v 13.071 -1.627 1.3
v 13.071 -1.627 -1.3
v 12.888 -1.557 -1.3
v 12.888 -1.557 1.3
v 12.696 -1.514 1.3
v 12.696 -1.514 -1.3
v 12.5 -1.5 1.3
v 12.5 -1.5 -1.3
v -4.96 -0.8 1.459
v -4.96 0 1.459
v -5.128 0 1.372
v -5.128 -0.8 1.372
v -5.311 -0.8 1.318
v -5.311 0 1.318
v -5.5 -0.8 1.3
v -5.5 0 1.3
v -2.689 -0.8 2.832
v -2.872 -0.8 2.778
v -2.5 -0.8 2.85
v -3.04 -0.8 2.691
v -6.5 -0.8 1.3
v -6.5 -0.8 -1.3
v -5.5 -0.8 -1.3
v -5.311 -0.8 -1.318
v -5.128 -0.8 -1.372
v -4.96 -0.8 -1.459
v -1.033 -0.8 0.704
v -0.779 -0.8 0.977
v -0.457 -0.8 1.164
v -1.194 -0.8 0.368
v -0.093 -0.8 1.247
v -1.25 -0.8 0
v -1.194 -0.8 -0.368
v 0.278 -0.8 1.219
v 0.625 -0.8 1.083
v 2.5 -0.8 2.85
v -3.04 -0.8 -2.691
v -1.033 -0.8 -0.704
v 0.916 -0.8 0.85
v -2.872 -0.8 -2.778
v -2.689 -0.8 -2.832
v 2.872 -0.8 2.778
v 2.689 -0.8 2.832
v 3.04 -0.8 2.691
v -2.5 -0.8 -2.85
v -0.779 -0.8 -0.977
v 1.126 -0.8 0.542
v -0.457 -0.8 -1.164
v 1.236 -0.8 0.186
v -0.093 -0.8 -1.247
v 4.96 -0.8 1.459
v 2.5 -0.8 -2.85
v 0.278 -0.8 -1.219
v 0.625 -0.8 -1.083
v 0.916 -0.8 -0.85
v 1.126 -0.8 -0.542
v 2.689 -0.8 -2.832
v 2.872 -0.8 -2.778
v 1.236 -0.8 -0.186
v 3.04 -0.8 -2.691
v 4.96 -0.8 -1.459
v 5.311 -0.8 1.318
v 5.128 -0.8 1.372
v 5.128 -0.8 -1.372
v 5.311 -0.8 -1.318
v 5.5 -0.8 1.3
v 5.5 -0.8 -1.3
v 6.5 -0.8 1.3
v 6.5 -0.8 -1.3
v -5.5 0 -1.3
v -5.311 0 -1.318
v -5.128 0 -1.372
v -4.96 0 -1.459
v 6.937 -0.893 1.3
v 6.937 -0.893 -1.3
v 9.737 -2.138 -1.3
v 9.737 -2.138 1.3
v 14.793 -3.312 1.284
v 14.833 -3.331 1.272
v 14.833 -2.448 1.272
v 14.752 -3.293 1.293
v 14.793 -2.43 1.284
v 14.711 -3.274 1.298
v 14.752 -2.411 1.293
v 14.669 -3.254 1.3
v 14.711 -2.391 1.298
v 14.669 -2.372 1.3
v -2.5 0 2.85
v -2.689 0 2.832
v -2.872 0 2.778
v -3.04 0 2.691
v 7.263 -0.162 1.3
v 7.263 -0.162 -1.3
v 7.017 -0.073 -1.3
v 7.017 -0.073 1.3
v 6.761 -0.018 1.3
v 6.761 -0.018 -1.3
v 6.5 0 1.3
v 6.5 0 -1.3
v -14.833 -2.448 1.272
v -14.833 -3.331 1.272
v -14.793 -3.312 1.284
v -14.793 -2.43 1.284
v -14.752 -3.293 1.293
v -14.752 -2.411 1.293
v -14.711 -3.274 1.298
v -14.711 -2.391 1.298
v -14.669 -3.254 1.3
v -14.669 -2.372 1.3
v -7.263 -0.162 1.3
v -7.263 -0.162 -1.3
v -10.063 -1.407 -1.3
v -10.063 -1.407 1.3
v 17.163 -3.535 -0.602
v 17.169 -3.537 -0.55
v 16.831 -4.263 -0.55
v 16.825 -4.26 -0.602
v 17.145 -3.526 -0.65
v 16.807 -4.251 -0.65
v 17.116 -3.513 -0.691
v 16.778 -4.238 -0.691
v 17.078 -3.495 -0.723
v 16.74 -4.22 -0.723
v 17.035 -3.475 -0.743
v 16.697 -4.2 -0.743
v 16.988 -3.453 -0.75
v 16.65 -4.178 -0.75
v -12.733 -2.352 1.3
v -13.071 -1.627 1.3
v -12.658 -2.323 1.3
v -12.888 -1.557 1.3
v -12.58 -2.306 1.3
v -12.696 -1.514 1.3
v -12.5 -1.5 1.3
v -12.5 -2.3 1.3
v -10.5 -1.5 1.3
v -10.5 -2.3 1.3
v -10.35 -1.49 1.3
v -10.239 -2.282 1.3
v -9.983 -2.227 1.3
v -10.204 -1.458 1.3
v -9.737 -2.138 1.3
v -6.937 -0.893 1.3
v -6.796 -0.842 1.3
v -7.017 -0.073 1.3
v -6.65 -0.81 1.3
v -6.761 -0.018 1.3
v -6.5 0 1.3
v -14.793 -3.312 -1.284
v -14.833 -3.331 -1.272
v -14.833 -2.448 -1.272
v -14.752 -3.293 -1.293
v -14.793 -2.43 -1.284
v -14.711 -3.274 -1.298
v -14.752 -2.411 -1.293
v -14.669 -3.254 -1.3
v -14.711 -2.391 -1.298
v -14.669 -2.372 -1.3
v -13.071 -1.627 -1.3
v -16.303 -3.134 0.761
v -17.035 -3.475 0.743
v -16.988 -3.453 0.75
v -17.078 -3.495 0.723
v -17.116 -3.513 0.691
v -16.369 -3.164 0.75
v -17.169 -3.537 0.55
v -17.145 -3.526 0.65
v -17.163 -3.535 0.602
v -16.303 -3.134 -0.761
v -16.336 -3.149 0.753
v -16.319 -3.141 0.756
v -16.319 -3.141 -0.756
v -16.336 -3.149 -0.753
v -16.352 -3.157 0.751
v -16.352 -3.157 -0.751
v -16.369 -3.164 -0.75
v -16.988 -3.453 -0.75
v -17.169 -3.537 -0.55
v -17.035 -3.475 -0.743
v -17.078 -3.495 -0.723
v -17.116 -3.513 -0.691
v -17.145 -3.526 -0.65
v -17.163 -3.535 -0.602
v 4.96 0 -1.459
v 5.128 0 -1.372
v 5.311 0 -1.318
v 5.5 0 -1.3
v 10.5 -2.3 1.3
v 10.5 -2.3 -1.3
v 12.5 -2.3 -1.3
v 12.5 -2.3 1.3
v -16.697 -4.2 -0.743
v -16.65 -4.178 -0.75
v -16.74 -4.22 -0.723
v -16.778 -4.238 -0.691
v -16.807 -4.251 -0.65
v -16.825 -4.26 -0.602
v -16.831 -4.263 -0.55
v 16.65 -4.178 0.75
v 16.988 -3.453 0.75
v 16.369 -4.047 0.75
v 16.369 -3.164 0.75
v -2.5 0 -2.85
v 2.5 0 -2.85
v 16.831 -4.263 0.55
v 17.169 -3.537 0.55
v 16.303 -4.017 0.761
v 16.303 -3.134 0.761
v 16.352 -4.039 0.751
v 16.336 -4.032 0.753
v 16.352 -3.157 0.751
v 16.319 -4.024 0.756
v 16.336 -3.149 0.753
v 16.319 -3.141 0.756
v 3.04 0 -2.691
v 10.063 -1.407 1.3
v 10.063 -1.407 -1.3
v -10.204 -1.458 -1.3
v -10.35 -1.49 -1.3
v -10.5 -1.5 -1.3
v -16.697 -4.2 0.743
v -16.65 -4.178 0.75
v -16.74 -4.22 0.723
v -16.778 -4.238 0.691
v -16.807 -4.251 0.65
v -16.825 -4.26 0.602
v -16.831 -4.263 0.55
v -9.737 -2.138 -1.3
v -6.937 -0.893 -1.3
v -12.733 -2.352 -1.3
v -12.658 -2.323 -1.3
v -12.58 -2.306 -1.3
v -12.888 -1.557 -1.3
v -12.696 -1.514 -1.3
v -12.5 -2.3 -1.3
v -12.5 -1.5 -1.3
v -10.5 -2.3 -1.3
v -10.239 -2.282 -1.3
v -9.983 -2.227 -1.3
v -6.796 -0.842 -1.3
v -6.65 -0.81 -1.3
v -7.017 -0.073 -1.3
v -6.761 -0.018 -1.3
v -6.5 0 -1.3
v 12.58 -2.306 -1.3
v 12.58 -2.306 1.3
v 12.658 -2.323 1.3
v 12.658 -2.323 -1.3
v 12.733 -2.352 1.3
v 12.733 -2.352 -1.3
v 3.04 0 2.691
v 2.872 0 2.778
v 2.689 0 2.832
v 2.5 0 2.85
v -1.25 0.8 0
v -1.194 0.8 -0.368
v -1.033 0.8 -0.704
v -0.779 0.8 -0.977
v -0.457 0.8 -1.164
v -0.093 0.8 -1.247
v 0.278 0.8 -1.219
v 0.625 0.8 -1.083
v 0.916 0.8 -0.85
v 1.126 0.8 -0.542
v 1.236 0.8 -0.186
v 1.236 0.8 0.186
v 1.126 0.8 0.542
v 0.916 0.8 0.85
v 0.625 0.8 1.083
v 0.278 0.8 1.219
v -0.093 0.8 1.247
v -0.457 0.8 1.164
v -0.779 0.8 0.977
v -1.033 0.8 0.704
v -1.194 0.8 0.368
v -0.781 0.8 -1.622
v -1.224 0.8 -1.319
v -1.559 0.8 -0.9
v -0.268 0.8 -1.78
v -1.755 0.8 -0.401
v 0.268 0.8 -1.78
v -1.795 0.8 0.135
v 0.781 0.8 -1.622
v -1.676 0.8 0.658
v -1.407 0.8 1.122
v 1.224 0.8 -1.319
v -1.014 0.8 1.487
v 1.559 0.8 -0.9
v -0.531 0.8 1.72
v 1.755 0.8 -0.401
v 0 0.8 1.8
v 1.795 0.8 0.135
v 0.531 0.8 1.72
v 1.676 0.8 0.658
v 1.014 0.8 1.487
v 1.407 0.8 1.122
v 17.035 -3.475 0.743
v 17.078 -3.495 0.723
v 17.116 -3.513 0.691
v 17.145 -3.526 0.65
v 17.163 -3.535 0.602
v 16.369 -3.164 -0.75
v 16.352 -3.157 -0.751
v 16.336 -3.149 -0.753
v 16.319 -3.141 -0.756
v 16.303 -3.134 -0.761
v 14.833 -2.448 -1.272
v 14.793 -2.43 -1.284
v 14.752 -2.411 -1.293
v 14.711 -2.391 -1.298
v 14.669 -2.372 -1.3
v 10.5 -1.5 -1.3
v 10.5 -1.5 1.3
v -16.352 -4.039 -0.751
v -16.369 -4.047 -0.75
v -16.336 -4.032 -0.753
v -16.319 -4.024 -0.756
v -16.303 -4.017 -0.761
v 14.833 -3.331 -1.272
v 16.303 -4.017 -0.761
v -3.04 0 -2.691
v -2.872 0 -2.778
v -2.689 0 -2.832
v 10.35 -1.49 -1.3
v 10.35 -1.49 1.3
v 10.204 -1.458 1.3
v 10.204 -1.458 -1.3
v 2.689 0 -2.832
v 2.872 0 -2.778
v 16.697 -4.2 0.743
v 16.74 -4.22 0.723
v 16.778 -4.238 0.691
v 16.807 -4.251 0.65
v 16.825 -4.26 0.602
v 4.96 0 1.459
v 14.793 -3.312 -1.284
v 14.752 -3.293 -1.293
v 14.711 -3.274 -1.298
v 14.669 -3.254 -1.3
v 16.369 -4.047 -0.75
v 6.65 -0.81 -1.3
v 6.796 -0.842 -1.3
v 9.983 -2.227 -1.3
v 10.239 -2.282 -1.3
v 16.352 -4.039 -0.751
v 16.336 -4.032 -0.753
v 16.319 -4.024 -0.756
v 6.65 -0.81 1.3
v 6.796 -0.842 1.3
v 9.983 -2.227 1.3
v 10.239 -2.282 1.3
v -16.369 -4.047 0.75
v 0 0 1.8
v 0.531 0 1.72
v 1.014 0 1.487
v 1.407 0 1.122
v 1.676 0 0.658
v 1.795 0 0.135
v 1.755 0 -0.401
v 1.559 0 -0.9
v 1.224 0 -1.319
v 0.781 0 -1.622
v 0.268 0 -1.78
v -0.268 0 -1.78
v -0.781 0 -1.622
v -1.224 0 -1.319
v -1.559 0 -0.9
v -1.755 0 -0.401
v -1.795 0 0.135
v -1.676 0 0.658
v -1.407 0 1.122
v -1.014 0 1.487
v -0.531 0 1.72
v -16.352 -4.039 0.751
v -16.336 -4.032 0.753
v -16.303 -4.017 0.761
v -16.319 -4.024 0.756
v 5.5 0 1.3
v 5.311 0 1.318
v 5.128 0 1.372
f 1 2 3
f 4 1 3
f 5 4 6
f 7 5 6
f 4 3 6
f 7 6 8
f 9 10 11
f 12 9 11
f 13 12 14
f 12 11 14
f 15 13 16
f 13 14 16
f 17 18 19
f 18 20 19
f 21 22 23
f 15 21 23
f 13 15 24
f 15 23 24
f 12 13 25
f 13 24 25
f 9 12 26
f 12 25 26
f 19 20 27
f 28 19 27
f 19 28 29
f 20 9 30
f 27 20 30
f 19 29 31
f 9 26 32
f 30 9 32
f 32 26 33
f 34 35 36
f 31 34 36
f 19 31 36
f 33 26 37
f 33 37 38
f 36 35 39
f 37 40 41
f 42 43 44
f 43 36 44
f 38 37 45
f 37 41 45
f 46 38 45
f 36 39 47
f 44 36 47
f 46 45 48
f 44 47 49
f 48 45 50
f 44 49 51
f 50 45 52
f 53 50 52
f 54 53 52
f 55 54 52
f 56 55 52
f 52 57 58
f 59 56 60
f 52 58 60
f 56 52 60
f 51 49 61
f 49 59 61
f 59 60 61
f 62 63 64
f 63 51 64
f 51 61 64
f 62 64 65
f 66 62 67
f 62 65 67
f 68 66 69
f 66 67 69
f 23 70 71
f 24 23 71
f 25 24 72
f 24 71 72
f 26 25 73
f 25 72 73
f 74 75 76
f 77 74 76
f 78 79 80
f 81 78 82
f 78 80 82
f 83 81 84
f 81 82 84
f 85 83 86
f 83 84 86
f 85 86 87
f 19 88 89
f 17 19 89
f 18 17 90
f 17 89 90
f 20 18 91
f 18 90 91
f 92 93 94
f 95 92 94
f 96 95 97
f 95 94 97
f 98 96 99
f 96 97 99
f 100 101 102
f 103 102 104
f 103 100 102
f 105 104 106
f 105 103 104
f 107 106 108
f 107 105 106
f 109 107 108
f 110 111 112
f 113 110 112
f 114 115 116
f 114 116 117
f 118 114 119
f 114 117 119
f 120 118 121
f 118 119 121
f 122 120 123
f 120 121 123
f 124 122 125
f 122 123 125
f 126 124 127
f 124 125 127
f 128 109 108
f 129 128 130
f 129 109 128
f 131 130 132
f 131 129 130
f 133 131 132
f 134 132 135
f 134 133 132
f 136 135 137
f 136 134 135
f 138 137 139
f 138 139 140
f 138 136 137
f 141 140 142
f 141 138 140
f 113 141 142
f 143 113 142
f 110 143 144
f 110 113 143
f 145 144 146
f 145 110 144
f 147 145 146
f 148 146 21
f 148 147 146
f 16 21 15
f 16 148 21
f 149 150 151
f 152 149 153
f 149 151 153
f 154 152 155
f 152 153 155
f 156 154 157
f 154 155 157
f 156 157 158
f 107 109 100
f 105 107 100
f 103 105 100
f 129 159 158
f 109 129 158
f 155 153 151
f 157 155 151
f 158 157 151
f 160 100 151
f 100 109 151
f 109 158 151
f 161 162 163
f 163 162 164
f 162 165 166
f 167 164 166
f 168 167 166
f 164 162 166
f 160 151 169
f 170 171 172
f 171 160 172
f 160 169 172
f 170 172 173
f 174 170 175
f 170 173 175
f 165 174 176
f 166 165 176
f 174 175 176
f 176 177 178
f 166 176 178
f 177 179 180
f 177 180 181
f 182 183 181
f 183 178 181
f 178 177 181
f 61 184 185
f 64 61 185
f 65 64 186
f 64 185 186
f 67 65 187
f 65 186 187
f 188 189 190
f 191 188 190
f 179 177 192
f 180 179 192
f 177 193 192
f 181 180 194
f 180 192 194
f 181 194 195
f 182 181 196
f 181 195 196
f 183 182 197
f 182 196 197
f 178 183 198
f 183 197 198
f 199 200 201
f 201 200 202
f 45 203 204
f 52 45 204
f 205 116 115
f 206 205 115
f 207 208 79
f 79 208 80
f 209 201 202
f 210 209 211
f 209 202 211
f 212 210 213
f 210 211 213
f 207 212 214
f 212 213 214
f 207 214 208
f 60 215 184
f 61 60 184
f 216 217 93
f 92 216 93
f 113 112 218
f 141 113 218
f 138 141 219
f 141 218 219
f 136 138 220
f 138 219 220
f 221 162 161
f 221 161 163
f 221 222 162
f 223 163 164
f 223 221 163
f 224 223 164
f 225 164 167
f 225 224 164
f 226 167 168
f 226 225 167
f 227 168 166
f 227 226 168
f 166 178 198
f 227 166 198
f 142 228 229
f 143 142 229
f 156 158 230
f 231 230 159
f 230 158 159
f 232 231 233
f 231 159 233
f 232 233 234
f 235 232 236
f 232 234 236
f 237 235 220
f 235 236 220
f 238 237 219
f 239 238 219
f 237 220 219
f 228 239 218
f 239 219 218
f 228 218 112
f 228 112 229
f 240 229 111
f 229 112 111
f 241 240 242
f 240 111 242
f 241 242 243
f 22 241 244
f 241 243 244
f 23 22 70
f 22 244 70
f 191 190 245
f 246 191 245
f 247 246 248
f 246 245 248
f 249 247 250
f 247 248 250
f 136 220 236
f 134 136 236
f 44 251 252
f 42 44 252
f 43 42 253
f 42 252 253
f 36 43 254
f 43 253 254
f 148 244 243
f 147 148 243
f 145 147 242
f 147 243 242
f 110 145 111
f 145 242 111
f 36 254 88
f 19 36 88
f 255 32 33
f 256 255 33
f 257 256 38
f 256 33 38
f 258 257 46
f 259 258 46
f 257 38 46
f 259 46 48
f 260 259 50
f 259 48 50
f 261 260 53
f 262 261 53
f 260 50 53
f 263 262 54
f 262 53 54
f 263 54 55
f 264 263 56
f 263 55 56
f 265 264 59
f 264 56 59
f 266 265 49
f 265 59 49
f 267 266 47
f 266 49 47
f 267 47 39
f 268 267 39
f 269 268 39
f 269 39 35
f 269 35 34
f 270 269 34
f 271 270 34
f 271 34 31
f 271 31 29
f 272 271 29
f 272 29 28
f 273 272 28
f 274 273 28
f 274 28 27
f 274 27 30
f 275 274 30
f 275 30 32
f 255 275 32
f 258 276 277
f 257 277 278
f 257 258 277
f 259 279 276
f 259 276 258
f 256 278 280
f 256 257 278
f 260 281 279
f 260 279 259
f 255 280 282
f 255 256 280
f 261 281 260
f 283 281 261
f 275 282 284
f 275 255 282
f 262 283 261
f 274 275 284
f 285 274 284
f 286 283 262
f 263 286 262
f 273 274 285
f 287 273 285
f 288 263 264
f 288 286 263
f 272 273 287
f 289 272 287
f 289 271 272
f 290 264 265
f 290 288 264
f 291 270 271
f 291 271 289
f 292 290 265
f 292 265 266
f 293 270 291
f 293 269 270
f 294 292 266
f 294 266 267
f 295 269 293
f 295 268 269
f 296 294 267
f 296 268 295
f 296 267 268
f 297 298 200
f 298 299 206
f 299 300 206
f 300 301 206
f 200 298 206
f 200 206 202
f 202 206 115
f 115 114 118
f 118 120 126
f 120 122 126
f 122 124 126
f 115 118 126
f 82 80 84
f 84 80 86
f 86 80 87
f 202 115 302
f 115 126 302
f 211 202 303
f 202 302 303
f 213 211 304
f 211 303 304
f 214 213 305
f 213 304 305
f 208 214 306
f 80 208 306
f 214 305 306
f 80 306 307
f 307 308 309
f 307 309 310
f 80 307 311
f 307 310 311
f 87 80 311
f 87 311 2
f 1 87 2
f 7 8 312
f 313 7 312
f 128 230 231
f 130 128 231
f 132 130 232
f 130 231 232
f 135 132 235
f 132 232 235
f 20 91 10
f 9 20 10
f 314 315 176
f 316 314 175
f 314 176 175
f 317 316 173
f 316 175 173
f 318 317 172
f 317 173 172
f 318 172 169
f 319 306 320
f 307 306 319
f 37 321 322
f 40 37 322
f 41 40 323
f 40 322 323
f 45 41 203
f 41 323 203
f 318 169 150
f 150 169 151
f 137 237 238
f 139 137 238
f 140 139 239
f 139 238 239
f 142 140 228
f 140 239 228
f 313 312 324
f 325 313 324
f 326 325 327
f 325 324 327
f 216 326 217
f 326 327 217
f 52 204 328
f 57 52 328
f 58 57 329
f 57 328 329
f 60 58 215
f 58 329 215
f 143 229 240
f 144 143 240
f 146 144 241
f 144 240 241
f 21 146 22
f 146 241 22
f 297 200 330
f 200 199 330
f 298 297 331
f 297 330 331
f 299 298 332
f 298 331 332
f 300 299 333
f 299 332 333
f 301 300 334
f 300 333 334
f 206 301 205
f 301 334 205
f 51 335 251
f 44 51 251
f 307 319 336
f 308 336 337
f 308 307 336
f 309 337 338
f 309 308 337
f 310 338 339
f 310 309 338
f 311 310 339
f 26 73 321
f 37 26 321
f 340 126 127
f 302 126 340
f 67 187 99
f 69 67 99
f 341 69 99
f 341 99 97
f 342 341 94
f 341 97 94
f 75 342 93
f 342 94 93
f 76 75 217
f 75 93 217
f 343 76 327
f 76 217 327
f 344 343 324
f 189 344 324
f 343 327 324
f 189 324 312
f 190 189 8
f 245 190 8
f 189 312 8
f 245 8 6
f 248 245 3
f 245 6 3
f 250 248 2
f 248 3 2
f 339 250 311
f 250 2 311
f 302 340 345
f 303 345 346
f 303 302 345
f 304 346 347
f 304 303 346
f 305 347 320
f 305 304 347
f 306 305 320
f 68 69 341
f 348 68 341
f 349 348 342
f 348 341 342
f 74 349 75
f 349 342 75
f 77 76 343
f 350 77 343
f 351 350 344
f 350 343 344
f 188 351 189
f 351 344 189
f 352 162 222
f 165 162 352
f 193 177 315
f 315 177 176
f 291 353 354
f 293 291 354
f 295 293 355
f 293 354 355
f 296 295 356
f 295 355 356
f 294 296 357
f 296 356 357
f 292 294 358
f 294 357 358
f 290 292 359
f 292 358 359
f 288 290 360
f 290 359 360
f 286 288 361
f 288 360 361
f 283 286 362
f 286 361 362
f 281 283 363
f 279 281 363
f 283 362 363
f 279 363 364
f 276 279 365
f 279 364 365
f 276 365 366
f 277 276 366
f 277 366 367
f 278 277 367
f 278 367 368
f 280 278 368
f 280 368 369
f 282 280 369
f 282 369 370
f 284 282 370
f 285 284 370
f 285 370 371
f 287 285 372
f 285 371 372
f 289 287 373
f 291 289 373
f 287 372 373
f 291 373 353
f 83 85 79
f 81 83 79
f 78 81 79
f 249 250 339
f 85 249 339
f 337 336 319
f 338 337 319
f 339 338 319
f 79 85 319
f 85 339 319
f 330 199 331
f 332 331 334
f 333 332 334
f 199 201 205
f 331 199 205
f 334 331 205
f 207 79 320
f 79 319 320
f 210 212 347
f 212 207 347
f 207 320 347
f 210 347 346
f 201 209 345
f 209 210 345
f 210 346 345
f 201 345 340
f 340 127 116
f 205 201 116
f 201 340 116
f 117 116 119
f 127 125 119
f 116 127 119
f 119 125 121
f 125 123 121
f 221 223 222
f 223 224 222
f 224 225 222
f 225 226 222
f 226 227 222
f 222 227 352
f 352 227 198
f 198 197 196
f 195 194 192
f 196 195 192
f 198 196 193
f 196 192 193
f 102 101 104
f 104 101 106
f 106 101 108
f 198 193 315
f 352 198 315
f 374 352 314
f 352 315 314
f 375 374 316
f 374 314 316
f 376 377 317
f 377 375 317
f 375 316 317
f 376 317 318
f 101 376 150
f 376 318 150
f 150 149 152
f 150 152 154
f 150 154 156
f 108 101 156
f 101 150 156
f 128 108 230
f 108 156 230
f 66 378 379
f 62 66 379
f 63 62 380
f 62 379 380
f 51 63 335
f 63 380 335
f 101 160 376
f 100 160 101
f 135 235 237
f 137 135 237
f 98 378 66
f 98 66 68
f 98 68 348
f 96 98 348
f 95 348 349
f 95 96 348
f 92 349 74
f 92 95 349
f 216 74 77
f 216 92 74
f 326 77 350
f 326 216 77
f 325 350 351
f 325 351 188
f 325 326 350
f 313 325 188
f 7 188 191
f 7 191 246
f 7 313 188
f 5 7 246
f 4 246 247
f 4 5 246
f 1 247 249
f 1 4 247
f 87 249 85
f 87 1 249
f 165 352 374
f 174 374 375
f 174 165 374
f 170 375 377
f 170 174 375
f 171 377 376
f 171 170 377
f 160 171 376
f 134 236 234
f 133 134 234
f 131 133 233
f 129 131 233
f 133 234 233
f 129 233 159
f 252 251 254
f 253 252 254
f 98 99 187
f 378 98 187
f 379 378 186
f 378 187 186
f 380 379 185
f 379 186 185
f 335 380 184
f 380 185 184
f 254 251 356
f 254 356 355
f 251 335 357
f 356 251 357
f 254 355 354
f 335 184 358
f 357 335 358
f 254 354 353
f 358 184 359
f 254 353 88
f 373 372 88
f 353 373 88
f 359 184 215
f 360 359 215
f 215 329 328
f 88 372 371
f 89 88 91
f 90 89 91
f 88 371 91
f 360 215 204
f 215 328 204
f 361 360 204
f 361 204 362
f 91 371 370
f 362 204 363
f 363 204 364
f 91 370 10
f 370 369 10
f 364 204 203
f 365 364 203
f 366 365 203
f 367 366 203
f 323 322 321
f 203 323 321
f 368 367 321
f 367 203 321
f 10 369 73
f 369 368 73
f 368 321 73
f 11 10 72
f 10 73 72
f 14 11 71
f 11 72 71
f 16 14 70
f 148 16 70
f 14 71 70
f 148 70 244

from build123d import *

# Parameters (mm, degrees)
BOSS_EXTRUDE1_DEPTH   = 0.8
SWEEP1_START          = -1.3
SWEEP1_DEPTH          = 2.6
SWEEP2_START          = -1.3
SWEEP2_DEPTH          = 2.6
CUT_EXTRUDE1_DEPTH    = 18.918364565
MIRROR3_COPY_1_DEPTH  = 18.918364565
SKETCH5_R             = 1.8
SKETCH5_R_2           = 1.2
BOSS_EXTRUDE2_DEPTH   = 0.8
M3X0_5_TAPPED_HOLE1_D = 2.5
FILLET1_R             = 0.2


# Read off the part's stored shape, not the designer's step: Sweep1, Sweep2
with BuildPart() as part:
    # Sketch1 → Boss-Extrude1 (new body)
    with BuildSketch(Plane(origin=(0, 0, 0), x_dir=(1, 0, 0), z_dir=(0, 1, 0))):
        with BuildLine():
            Line((-2.5, 2.85), (2.5, 2.85))
            ThreePointArc((2.5, 2.85), (2.78163021, 2.809523019), (3.040461339, 2.691368849))
            Line((3.040461339, 2.691368849), (4.959538661, 1.458631151))
            ThreePointArc((4.959538661, 1.458631151), (5.21836979, 1.340476981), (5.5, 1.3))
            Line((5.5, 1.3), (5.5, -1.3))
            ThreePointArc((5.5, -1.3), (5.21836979, -1.340476981), (4.959538661, -1.458631151))
            Line((4.959538661, -1.458631151), (3.040461339, -2.691368849))
            ThreePointArc((3.040461339, -2.691368849), (2.78163021, -2.809523019), (2.5, -2.85))
            Line((2.5, -2.85), (-2.5, -2.85))
            ThreePointArc((-2.5, -2.85), (-2.78163021, -2.809523019), (-3.040461339, -2.691368849))
            Line((-3.040461339, -2.691368849), (-4.959538661, -1.458631151))
            ThreePointArc((-4.959538661, -1.458631151), (-5.21836979, -1.340476981), (-5.5, -1.3))
            Line((-5.5, -1.3), (-5.5, 1.3))
            ThreePointArc((-5.5, 1.3), (-5.21836979, 1.340476981), (-4.959538661, 1.458631151))
            Line((-4.959538661, 1.458631151), (-3.040461339, 2.691368849))
            ThreePointArc((-3.040461339, 2.691368849), (-2.78163021, 2.809523019), (-2.5, 2.85))
        make_face()
    extrude(amount=-BOSS_EXTRUDE1_DEPTH)

    # Sweep1 outline → Sweep1 (add)
    with BuildSketch(Plane.XY.offset(SWEEP1_START)):
        with BuildLine():
            Line((-13.071251863, -1.626643489), (-17.169047305, -3.537476885))
            Line((-17.169047305, -3.537476885), (-16.830952695, -4.262523115))
            Line((-16.830952695, -4.262523115), (-12.733157253, -2.351689719))
            ThreePointArc((-12.733157253, -2.351689719), (-12.619409099, -2.313077423), (-12.5, -2.3))
            Line((-12.5, -2.3), (-10.5, -2.3))
            ThreePointArc((-10.5, -2.3), (-10.110231056, -2.259075901), (-9.737462135, -2.138088534))
            Line((-9.737462135, -2.138088534), (-6.937462135, -0.892887369))
            ThreePointArc((-6.937462135, -0.892887369), (-6.723607459, -0.823477842), (-6.5, -0.8))
            Line((-6.5, -0.8), (-5.5, -0.8))
            Line((-5.5, -0.8), (-5.5, 0))
            Line((-5.5, 0), (-6.5, 0))
            ThreePointArc((-6.5, 0), (-6.889768944, -0.040924099), (-7.262537865, -0.161911466))
            Line((-7.262537865, -0.161911466), (-10.062537865, -1.407112631))
            ThreePointArc((-10.062537865, -1.407112631), (-10.276392541, -1.476522158), (-10.5, -1.5))
            Line((-10.5, -1.5), (-12.5, -1.5))
            ThreePointArc((-12.5, -1.5), (-12.79256079, -1.532040618), (-13.071251863, -1.626643489))
        make_face()
    extrude(amount=SWEEP1_DEPTH)

    # Sweep2 outline → Sweep2 (add)
    with BuildSketch(Plane.XY.offset(SWEEP2_START)):
        with BuildLine():
            ThreePointArc((13.071251863, -1.626643489), (12.79256079, -1.532040618), (12.5, -1.5))
            Line((12.5, -1.5), (10.5, -1.5))
            ThreePointArc((10.5, -1.5), (10.276392541, -1.476522158), (10.062537865, -1.407112631))
            Line((10.062537865, -1.407112631), (7.262537865, -0.161911466))
            ThreePointArc((7.262537865, -0.161911466), (6.889768944, -0.040924099), (6.5, 0))
            Line((6.5, 0), (5.5, 0))
            Line((5.5, 0), (5.5, -0.8))
            Line((5.5, -0.8), (6.5, -0.8))
            ThreePointArc((6.5, -0.8), (6.723607459, -0.823477842), (6.937462135, -0.892887369))
            Line((6.937462135, -0.892887369), (9.737462135, -2.138088534))
            ThreePointArc((9.737462135, -2.138088534), (10.110231056, -2.259075901), (10.5, -2.3))
            Line((10.5, -2.3), (12.5, -2.3))
            ThreePointArc((12.5, -2.3), (12.619409099, -2.313077423), (12.733157253, -2.351689719))
            Line((12.733157253, -2.351689719), (16.830952695, -4.262523115))
            Line((16.830952695, -4.262523115), (17.169047305, -3.537476885))
            Line((17.169047305, -3.537476885), (13.071251863, -1.626643489))
        make_face()
    extrude(amount=SWEEP2_DEPTH)

    # Sketch3 → Cut-Extrude1 (cut, through all)
    with BuildSketch(Plane(origin=(0, 0, 0), x_dir=(1, 0, 0), z_dir=(0, 1, 0))):
        with BuildLine():
            Line((-17.169047305, 0.75), (-16.369047305, 0.75))
            ThreePointArc((-16.369047305, 0.75), (-16.335739791, 0.752792978), (-16.303362548, 0.761093905))
            Line((-16.303362548, 0.761093905), (-14.833259195, 1.272265238))
            ThreePointArc((-14.833259195, 1.272265238), (-14.75231609, 1.293017555), (-14.669047305, 1.3))
            Line((-14.669047305, 1.3), (-17.169047305, 1.3))
            Line((-17.169047305, 1.3), (-17.169047305, 0.75))
        make_face()
    cut_extrude1 = extrude(amount=-CUT_EXTRUDE1_DEPTH, mode=Mode.SUBTRACT)

    # Mirror1: Cut-Extrude1 across plane
    add(cut_extrude1.mirror(Plane.XY), mode=Mode.SUBTRACT)

    # Mirror3: Cut-Extrude1 across plane
    add(cut_extrude1.mirror(Plane(origin=(0, 0, 0), x_dir=(0, 0, 1), z_dir=(1, 0, 0))), mode=Mode.SUBTRACT)

    # Mirror3 copy 1 sketch → Mirror3 copy 1 (cut, through all)
    with BuildSketch(Plane(origin=(0, 0, 0), x_dir=(-1, 0, 0), z_dir=(0, 1, 0))):
        with BuildLine():
            Line((-17.169047305, 0.75), (-16.369047305, 0.75))
            ThreePointArc((-16.369047305, 0.75), (-16.335739791, 0.752792978), (-16.303362548, 0.761093905))
            Line((-16.303362548, 0.761093905), (-14.833259195, 1.272265238))
            ThreePointArc((-14.833259195, 1.272265238), (-14.75231609, 1.293017555), (-14.669047305, 1.3))
            Line((-14.669047305, 1.3), (-17.169047305, 1.3))
            Line((-17.169047305, 1.3), (-17.169047305, 0.75))
        make_face()
    extrude(amount=-MIRROR3_COPY_1_DEPTH, mode=Mode.SUBTRACT)

    # Sketch5 → Boss-Extrude2 (add)
    with BuildSketch(Plane(origin=(0, 0, 0), x_dir=(1, 0, 0), z_dir=(0, 1, 0))):
        with Locations(Location((0, 0, 0), (0, 0, 270))):
            Circle(SKETCH5_R)
        with Locations(Location((0, 0, 0), (0, 0, 270))):
            Circle(SKETCH5_R_2, mode=Mode.SUBTRACT)
    extrude(amount=BOSS_EXTRUDE2_DEPTH)

    # M3x0.5 Tapped Hole1 (through all)
    with Locations(Plane(origin=(0, 0.8, 0), x_dir=(1, 0, 0), z_dir=(0, 1, 0))):
        with Locations((0, 0)):
            Hole(M3X0_5_TAPPED_HOLE1_D / 2)

    # Fillet1
    fillet1_edges = [part.edges().sort_by_distance(p)[0] for p in [
        (-17, -3.9, -0.75),
        (-17, -3.9, 0.75),
        (17, -3.9, -0.75),
        (17, -3.9, 0.75),
    ]]
    fillet(fillet1_edges, radius=FILLET1_R)


solid = part.part
